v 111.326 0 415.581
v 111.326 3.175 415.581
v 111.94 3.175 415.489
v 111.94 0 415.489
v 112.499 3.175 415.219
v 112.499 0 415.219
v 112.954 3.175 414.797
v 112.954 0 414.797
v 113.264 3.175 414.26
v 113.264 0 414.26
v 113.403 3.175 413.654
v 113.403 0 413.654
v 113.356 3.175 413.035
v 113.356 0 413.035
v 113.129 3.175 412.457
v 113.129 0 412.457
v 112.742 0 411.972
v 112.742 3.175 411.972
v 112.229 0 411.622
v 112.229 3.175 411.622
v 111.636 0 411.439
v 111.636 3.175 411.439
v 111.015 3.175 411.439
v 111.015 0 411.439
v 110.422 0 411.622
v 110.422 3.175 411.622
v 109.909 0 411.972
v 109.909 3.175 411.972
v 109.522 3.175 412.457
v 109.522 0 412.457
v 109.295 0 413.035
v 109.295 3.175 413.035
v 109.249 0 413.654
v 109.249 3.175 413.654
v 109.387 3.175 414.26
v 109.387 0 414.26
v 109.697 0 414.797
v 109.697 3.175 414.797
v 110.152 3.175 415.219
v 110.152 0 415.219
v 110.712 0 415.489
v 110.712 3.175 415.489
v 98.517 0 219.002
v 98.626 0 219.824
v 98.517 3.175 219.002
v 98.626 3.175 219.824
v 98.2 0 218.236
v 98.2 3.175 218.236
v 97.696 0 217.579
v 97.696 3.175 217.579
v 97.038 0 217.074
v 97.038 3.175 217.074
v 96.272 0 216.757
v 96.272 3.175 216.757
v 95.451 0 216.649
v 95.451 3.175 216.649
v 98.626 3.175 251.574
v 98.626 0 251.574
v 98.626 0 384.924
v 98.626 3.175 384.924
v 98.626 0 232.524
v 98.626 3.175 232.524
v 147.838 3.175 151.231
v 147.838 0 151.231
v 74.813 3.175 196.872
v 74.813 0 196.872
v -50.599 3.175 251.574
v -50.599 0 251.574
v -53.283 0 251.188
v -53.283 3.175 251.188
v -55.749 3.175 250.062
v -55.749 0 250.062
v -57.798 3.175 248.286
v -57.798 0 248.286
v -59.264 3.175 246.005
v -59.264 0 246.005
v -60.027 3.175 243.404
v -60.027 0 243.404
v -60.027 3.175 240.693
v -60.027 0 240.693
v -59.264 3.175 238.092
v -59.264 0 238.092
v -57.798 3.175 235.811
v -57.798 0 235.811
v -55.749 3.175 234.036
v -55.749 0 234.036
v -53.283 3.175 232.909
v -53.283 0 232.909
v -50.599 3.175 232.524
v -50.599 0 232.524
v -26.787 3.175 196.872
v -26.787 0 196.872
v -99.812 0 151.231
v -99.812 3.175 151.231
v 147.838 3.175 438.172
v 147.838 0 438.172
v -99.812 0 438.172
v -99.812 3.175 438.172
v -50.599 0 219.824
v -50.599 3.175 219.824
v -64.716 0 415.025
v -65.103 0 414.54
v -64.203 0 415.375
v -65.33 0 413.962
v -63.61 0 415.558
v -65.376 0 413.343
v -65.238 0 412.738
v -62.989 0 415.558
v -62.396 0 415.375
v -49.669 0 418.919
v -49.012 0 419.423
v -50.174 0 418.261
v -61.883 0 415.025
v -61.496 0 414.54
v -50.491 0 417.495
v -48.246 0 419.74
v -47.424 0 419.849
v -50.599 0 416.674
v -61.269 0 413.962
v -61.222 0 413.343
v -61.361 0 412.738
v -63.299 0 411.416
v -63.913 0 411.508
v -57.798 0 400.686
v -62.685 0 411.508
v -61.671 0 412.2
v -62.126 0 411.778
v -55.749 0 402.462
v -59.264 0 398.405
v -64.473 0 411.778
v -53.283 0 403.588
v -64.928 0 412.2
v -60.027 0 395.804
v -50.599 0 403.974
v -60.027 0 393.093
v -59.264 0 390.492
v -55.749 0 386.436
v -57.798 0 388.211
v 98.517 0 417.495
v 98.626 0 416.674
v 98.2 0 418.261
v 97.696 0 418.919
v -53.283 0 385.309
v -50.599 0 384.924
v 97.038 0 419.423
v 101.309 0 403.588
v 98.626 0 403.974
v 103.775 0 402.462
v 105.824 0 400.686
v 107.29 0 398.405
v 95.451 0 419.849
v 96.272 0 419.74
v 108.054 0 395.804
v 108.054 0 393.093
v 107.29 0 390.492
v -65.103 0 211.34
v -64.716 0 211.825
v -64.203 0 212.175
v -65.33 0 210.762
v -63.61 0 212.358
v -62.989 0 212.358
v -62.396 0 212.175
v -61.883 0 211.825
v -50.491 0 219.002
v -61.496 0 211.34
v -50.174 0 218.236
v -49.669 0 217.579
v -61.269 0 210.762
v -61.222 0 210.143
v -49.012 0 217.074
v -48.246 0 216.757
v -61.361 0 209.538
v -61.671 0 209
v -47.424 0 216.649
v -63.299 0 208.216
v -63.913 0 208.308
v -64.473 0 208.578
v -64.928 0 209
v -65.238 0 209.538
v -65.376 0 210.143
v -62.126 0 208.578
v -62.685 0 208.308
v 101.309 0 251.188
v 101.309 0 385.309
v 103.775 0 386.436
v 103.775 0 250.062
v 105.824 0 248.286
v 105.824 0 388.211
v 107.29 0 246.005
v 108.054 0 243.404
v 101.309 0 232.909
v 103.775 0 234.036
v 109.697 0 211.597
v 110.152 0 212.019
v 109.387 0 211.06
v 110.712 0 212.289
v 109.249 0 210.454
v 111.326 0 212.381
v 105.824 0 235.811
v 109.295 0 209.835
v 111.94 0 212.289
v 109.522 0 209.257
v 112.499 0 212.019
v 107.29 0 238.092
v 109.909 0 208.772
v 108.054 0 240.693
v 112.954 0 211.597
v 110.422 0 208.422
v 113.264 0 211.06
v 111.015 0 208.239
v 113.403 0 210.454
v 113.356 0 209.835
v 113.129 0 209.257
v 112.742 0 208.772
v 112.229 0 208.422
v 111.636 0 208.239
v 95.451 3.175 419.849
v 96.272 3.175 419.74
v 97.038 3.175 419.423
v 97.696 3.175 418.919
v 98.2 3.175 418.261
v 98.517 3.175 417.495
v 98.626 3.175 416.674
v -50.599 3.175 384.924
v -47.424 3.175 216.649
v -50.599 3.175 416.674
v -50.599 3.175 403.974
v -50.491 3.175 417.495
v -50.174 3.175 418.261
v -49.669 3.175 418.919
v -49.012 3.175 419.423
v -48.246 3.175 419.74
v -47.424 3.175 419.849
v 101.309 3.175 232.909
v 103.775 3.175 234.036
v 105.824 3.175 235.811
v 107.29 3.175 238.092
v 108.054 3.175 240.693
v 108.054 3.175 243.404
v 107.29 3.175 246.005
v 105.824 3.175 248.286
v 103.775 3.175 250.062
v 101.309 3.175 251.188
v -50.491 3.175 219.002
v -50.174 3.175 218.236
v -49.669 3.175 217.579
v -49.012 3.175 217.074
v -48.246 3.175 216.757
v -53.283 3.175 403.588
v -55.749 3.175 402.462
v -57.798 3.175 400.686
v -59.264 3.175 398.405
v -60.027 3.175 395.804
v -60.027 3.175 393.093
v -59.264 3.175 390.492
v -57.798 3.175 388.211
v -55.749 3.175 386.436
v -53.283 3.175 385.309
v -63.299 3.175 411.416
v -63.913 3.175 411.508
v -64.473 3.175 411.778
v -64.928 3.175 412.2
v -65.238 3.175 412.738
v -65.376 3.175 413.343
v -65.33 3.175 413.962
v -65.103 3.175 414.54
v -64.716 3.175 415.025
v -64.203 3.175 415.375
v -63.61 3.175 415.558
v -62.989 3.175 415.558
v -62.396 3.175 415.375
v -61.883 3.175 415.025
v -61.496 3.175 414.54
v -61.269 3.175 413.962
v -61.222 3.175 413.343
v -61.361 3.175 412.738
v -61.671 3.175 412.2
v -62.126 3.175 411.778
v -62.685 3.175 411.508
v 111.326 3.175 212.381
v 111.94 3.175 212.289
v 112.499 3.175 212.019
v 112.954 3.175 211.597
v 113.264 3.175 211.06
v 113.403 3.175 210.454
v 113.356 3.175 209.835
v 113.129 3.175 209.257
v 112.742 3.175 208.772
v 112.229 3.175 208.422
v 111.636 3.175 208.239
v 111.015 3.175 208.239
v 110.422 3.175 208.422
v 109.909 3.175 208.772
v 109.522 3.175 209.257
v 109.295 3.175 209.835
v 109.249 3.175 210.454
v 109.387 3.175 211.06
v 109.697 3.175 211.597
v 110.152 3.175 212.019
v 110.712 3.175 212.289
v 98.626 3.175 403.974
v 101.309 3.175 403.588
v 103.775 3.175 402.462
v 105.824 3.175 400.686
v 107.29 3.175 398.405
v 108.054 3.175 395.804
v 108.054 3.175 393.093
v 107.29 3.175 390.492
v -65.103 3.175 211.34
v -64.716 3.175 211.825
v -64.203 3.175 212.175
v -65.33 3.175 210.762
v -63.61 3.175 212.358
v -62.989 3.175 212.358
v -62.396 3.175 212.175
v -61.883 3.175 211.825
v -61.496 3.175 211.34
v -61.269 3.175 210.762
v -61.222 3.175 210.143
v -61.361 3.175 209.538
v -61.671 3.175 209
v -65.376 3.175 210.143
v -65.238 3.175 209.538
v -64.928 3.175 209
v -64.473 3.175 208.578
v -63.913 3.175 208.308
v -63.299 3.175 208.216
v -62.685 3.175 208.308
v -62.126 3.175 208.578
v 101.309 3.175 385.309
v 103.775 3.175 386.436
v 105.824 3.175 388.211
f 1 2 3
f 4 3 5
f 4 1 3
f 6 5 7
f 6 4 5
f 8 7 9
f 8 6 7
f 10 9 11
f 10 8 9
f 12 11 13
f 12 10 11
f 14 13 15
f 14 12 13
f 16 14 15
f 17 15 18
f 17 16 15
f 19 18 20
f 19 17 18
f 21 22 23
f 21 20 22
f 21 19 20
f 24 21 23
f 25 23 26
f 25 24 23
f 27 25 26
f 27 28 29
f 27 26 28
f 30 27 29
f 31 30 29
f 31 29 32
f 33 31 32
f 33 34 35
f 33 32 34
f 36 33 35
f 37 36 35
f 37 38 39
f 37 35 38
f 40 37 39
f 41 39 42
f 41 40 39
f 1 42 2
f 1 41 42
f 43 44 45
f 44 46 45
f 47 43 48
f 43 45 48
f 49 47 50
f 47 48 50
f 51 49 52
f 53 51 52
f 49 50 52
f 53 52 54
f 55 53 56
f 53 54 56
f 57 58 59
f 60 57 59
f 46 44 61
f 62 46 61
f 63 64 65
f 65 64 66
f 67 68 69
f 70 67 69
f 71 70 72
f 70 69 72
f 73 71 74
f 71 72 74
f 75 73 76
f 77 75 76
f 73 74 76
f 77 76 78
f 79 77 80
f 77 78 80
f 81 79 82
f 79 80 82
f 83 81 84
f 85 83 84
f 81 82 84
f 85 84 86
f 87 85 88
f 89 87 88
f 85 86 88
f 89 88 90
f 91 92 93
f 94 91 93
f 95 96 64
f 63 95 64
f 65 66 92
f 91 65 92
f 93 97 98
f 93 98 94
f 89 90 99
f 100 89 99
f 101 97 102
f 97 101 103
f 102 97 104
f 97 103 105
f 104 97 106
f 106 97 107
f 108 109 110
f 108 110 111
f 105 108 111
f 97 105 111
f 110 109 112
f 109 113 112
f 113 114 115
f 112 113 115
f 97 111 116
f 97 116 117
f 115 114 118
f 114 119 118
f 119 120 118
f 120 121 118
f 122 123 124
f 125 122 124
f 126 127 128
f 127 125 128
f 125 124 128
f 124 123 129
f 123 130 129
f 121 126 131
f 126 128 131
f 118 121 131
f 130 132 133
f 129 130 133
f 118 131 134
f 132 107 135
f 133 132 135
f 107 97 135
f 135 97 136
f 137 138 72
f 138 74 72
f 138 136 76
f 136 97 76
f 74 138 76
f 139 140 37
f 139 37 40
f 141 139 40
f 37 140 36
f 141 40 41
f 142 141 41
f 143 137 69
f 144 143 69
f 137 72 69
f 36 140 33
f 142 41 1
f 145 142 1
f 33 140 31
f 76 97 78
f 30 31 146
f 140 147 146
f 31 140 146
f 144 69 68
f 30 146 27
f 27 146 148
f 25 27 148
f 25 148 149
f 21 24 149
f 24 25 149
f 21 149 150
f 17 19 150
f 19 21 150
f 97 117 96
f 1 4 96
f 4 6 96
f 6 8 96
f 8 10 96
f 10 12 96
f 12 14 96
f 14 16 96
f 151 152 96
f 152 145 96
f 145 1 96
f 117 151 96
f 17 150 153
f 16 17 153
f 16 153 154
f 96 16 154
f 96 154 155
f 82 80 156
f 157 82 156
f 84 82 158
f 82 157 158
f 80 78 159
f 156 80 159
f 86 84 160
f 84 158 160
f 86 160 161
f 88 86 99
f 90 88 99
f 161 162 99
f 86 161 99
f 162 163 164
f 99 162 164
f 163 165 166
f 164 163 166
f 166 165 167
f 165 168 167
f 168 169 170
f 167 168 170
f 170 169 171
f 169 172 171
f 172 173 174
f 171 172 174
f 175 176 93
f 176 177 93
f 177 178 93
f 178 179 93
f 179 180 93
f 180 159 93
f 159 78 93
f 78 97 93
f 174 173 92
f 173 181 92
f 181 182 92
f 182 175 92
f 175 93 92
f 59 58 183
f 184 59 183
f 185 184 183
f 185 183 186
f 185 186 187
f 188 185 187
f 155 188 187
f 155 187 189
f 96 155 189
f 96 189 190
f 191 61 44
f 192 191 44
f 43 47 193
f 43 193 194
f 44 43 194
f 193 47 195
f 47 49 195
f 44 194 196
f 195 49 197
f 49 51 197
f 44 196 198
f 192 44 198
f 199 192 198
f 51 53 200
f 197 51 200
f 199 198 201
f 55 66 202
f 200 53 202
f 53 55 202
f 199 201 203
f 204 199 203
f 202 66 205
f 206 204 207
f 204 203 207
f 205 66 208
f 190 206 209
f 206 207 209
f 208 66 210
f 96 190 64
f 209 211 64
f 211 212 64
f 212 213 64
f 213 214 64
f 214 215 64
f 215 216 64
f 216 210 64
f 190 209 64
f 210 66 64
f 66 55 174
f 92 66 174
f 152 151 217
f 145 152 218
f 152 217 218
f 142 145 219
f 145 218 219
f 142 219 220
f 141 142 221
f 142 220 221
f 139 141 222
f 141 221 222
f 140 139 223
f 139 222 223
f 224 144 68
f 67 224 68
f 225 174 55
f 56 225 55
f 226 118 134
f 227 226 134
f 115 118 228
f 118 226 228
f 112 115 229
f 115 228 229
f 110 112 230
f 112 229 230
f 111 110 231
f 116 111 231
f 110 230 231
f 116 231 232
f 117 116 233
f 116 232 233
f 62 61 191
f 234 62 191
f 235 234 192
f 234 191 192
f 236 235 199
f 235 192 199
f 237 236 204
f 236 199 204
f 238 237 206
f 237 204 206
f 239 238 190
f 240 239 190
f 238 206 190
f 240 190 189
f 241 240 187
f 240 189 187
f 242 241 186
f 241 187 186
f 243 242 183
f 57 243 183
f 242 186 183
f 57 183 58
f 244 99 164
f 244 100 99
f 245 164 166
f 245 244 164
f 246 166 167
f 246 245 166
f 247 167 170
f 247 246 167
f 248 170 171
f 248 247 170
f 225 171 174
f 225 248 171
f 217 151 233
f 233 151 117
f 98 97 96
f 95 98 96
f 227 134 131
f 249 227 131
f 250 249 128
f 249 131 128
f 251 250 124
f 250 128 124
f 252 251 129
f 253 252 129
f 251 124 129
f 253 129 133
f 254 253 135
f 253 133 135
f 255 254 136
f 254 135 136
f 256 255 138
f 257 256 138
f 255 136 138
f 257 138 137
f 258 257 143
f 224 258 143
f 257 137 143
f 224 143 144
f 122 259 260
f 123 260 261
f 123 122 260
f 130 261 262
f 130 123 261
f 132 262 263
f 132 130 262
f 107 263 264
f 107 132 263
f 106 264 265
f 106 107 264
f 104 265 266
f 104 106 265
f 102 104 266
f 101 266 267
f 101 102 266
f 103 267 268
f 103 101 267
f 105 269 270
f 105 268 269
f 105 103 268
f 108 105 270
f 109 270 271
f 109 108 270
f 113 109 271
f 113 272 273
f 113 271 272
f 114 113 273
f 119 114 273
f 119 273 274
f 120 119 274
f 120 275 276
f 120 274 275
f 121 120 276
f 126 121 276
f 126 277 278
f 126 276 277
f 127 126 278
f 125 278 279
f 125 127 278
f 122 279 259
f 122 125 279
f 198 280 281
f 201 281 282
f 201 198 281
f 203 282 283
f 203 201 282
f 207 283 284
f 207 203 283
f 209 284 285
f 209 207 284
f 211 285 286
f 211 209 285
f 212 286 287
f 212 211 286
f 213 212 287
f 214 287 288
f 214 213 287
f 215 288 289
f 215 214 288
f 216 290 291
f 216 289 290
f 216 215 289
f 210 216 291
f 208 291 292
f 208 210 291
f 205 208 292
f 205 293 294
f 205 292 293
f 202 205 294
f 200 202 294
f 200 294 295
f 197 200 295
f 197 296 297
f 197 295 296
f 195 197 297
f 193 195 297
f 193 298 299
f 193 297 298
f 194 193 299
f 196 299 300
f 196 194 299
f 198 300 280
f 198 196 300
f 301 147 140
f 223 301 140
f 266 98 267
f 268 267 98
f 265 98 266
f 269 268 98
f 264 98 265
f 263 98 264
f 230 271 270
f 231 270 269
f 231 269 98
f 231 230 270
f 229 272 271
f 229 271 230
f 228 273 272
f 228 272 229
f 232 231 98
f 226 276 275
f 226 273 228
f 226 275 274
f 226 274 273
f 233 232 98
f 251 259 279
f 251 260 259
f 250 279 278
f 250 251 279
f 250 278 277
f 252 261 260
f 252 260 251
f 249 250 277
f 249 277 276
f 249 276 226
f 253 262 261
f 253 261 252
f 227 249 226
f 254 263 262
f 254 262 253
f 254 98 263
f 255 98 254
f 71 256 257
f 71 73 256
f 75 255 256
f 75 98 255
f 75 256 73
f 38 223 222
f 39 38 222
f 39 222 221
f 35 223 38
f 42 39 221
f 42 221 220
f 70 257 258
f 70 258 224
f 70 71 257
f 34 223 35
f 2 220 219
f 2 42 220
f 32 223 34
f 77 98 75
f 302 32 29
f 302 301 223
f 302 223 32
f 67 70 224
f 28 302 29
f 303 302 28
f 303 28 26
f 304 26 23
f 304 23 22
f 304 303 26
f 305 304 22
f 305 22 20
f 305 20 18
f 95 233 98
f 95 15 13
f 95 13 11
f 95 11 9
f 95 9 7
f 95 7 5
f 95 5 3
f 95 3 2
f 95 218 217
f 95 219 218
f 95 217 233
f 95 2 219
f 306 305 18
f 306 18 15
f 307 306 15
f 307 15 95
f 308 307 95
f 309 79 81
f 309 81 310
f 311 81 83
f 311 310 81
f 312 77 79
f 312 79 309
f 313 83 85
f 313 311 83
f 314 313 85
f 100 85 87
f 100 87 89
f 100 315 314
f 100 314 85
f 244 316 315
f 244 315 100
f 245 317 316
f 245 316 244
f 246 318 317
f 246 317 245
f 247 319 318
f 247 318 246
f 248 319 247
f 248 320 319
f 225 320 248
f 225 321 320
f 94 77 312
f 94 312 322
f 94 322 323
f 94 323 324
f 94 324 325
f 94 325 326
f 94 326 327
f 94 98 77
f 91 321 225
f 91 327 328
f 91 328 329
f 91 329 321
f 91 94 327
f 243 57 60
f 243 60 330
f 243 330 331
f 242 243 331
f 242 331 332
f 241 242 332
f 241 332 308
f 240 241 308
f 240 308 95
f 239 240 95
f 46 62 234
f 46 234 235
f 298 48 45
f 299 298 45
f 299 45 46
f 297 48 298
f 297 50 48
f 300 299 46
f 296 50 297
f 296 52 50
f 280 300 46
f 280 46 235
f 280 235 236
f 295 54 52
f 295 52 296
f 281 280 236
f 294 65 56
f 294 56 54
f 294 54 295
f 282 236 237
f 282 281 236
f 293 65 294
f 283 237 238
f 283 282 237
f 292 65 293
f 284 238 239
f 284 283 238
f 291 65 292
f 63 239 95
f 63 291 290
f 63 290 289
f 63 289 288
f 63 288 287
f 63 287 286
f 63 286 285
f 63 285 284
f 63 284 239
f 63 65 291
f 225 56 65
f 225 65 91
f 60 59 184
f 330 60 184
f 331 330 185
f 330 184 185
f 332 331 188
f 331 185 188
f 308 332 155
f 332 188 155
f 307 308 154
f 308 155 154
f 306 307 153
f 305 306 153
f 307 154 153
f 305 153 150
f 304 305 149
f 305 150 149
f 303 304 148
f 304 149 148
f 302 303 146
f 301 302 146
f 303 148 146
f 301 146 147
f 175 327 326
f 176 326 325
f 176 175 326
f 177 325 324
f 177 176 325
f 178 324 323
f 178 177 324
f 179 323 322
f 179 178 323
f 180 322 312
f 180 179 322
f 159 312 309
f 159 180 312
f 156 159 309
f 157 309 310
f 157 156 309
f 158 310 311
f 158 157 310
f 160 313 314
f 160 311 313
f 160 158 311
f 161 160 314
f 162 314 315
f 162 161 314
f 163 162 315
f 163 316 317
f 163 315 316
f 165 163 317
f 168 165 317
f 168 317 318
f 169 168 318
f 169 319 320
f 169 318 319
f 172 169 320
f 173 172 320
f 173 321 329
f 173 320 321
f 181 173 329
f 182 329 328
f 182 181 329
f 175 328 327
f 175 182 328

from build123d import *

# Parameters (mm, degrees)
SKETCH1_W               = 63.5
SKETCH1_H               = 190.5
BOSS_EXTRUDE1_DEPTH     = 3.175
SKETCH3_R               = 2.0828
CUT_EXTRUDE2_DEPTH      = 526.850378691
SKETCH4_R               = 2.0828
CUT_EXTRUDE4_DEPTH      = 526.850378691
FILLET2_R               = 3.175
CUT_EXTRUDE5_DEPTH      = 526.850378691
CUT_EXTRUDE5_DEPTH_BACK = 526.850378691
SKETCH5_W               = 142.875
SKETCH5_H               = 355.6


with BuildPart() as part:
    # Sketch1 → Boss-Extrude1 (new body)
    with BuildSketch(Plane(origin=(0, 0, 0), x_dir=(1, 0, 0), z_dir=(0, 1, 0))):
        Polygon((-242.686835374, -133.432512515), (-242.686835374, -385.491221995), (-242.686835374, -387.371651362), (-191.886835374, -438.171651362), (239.913164626, -438.171651362), (290.713164626, -387.371651362), (290.713164626, -133.371651362), (176.413164626, -82.571651362), (176.413164626, -133.371651362), (74.813164626, -196.871651362), (-26.786835374, -196.871651362), (-128.386835374, -133.371651362), (-128.386835374, -82.571651362), (-242.686835374, -133.371651362), align=None)
        with Locations((233.563164626, -243.80020948)):
            Rectangle(SKETCH1_W, SKETCH1_H, mode=Mode.SUBTRACT)
        with Locations((-185.536835374, -243.80020948)):
            Rectangle(SKETCH1_W, SKETCH1_H, mode=Mode.SUBTRACT)
    extrude(amount=BOSS_EXTRUDE1_DEPTH)

    # Sketch3 → Cut-Extrude2 (cut, through all)
    with BuildSketch(Plane(origin=(0, 0, 0), x_dir=(1, 0, 0), z_dir=(0, 1, 0))):
        with Locations(Location((-114.278235374, -270.125471314, 0), (0, 0, 270))):
            Circle(SKETCH3_R)
        with Locations(Location((-143.449035374, -284.13540948, 0), (0, 0, 270))):
            Circle(SKETCH3_R)
        with Locations(Location((-114.278235374, -217.474947647, 0), (0, 0, 270))):
            Circle(SKETCH3_R)
        with Locations(Location((-143.449035374, -203.46500948, 0), (0, 0, 270))):
            Circle(SKETCH3_R)
        with Locations(Location((191.475364626, -284.13540948, 0), (0, 0, 270))):
            Circle(SKETCH3_R)
        with Locations(Location((162.304564626, -270.125471314, 0), (0, 0, 270))):
            Circle(SKETCH3_R)
        with Locations(Location((162.304564626, -217.474947647, 0), (0, 0, 270))):
            Circle(SKETCH3_R)
        with Locations(Location((191.475364626, -203.46500948, 0), (0, 0, 270))):
            Circle(SKETCH3_R)
    extrude(amount=CUT_EXTRUDE2_DEPTH, mode=Mode.SUBTRACT)

    # Sketch4 → Cut-Extrude4 (cut, through all)
    with BuildSketch(Plane(origin=(0, 0, 0), x_dir=(1, 0, 0), z_dir=(0, 1, 0))):
        with Locations(Location((111.325664626, -210.298576853, 0), (0, 0, 270))):
            Circle(SKETCH4_R)
        with Locations(Location((111.325664626, -413.498576853, 0), (0, 0, 270))):
            Circle(SKETCH4_R)
        with Locations(Location((-63.299335374, -413.498576853, 0), (0, 0, 90))):
            Circle(SKETCH4_R)
        with Locations(Location((-63.299335374, -210.298576853, 0), (0, 0, 90))):
            Circle(SKETCH4_R)
        with BuildLine():
            Line((-50.599335374, -216.648576853), (98.625664626, -216.648576853))
            Line((98.625664626, -216.648576853), (98.625664626, -232.523576853))
            ThreePointArc((98.625664626, -232.523576853), (108.150664626, -242.048576853), (98.625664626, -251.573576853))
            Line((98.625664626, -251.573576853), (98.625664626, -384.923576853))
            ThreePointArc((98.625664626, -384.923576853), (108.150664626, -394.448576853), (98.625664626, -403.973576853))
            Line((98.625664626, -403.973576853), (98.625664626, -419.848576853))
            Line((98.625664626, -419.848576853), (-50.599335374, -419.848576853))
            Line((-50.599335374, -419.848576853), (-50.599335374, -403.973576853))
            ThreePointArc((-50.599335374, -403.973576853), (-60.124335374, -394.448576853), (-50.599335374, -384.923576853))
            Line((-50.599335374, -384.923576853), (-50.599335374, -251.573576853))
            ThreePointArc((-50.599335374, -251.573576853), (-60.124335374, -242.048576853), (-50.599335374, -232.523576853))
            Line((-50.599335374, -232.523576853), (-50.599335374, -216.648576853))
        make_face()
    extrude(amount=CUT_EXTRUDE4_DEPTH, mode=Mode.SUBTRACT)

    # Fillet2
    fillet2_edges = [part.edges().sort_by_distance(p)[0] for p in [
        (98.625664626, 1.5875, 419.848576853),
        (98.625664626, 1.5875, 216.648576853),
        (-50.599335374, 1.5875, 216.648576853),
        (-50.599335374, 1.5875, 419.848576853),
    ]]
    fillet(fillet2_edges, radius=FILLET2_R)

    # Sketch5 → Cut-Extrude5 (cut, two sides: drawn at the far end of the back side and taken through both)
    with BuildSketch(Plane(origin=(0, 3.175, 0), x_dir=(1, 0, 0), z_dir=(0, 1, 0)).offset(-CUT_EXTRUDE5_DEPTH_BACK)):
        with Locations((-171.249335374, -260.371651362)):
            Rectangle(SKETCH5_W, SKETCH5_H)
        with Locations((219.275664626, -260.371651362)):
            Rectangle(SKETCH5_W, SKETCH5_H)
    extrude(amount=CUT_EXTRUDE5_DEPTH + CUT_EXTRUDE5_DEPTH_BACK, mode=Mode.SUBTRACT)


solid = part.part
